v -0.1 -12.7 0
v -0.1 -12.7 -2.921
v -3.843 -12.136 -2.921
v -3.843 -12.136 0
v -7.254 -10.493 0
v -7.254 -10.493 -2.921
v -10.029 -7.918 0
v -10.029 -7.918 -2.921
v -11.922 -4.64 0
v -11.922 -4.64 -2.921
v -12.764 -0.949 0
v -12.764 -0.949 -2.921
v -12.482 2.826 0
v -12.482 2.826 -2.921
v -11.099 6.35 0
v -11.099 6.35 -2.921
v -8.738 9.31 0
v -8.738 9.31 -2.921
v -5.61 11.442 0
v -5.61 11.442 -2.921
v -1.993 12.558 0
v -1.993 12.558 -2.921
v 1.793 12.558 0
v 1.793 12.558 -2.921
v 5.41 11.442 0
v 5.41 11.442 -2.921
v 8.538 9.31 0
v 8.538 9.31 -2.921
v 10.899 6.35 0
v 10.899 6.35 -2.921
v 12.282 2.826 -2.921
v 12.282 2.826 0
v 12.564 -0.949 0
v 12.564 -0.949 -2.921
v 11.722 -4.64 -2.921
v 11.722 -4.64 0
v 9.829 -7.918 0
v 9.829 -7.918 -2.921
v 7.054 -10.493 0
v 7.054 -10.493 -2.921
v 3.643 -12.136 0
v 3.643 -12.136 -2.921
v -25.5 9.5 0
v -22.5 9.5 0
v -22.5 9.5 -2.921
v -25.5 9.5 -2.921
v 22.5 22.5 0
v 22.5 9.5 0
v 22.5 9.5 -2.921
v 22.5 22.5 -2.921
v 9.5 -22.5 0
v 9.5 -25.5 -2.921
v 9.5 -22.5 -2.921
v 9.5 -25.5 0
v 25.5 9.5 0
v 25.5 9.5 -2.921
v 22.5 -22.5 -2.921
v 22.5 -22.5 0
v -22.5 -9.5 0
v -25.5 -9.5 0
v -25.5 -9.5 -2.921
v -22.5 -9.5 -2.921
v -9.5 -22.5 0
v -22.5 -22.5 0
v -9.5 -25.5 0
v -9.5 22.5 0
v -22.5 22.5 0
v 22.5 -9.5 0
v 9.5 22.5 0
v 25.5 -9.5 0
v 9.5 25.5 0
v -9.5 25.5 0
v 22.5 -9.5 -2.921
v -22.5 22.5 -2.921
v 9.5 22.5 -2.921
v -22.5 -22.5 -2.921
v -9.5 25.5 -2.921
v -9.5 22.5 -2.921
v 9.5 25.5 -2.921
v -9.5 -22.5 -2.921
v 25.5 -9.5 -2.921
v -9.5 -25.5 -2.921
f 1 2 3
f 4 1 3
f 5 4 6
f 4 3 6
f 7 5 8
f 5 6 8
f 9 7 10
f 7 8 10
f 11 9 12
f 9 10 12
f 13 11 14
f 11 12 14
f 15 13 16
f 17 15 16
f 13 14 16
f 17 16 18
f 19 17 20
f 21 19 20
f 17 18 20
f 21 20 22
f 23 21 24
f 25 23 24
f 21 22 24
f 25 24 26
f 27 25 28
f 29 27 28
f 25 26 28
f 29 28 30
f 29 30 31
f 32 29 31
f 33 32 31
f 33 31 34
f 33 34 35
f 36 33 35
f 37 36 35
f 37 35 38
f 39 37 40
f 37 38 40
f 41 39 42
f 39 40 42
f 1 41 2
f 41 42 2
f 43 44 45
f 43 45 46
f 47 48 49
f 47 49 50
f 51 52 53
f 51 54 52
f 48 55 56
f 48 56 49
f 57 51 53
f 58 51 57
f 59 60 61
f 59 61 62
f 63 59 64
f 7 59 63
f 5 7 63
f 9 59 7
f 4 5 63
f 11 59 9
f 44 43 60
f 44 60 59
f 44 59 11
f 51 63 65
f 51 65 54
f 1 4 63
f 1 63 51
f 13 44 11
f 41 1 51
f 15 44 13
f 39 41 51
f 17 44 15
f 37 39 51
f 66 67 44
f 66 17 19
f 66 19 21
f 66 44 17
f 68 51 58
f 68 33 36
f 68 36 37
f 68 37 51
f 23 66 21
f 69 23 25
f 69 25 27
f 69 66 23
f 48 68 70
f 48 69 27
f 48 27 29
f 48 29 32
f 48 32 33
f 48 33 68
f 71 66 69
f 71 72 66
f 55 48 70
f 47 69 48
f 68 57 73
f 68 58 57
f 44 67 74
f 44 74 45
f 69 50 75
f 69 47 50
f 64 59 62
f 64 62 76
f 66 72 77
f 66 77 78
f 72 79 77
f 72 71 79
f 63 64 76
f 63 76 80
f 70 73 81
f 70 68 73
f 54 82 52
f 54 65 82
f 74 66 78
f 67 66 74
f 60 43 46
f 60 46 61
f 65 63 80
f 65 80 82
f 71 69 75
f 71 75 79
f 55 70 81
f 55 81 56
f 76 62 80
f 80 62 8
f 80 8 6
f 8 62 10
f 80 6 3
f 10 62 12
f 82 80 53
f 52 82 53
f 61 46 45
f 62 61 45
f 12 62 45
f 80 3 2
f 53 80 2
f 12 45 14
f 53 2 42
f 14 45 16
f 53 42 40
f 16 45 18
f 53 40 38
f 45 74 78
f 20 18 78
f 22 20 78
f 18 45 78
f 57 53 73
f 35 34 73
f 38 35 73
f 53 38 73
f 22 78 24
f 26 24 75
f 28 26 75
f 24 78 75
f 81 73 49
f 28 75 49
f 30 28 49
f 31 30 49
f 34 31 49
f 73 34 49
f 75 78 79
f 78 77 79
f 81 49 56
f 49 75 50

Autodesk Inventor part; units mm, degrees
ref_plane "XY Plane" through (0, 0, 0) normal (0, 0, 1) x (1, 0, 0)
sketch "Sketch1" plane through (0, 0, 0) normal (0, 0, 1) x (1, 0, 0)
  line L0 (-25.5, -25.5) -> (25.5, -25.5)
  line L1 (25.5, -25.5) -> (25.5, 25.5)
  line L2 (25.5, 25.5) -> (-25.5, 25.5)
  line L3 (-25.5, 25.5) -> (-25.5, -25.5)
  line L4 (-25.5, -25.5) -> (25.5, 25.5) construction
  line L5 (25.5, -25.5) -> (-25.5, 25.5) construction
  point P0 (0, 0)
  dimension "d0" = 51
  dimension "d1" = 51
extrude "Extrusion1" add sketch "Sketch1" against normal blind 2.921
sketch "Sketch2" plane through (0, 0, 0) normal (0, 0, 1) x (1, 0, 0)
  line L0 (-25.5, 25.5) -> (-9.5, 25.5)
  line L1 (-9.5, 25.5) -> (-9.5, 22.5)
  line L2 (-9.5, 22.5) -> (-22.5, 22.5)
  line L3 (-25.5, 22.4108) -> (-25.5, 25.5)
  line L4 (-25.5, 25.5) -> (-22.225, 25.5)
  line L5 (-22.5, 22.5) -> (-22.5, 9.5)
  line L6 (-22.5, 9.5) -> (-25.5, 9.5)
  line L7 (-25.5, 9.5) -> (-25.5, 25.5)
  line L8 (25.5, 25.5) -> (-25.5, 25.5) projected
  line L9 (-25.5, 25.5) -> (-25.5, -25.5) projected
  dimension "d59" = 3
  dimension "d62" = 3
  dimension "d67" = 16
  dimension "d73" = 16
hole "Hole1" at (-0.1, 0, 0) direction (0, 0, -1) diameter 25.4 end through all
extrude "Extrusion4" cut sketch "Sketch2" against normal up to next
mirror "Mirror1" about plane through (0, 0, 0) normal (1, 0, 0) of "Extrusion4"
mirror "Mirror2" about plane through (0, 0, 0) normal (0, 1, 0) of "Extrusion4", "Mirror1"
equation "\"d1\" = d0"
equation "\"d62\" = d59"
equation "\"d67\" = d73"
equation "\"d53\" = 0.5 * d0"
properties part number "Top"
